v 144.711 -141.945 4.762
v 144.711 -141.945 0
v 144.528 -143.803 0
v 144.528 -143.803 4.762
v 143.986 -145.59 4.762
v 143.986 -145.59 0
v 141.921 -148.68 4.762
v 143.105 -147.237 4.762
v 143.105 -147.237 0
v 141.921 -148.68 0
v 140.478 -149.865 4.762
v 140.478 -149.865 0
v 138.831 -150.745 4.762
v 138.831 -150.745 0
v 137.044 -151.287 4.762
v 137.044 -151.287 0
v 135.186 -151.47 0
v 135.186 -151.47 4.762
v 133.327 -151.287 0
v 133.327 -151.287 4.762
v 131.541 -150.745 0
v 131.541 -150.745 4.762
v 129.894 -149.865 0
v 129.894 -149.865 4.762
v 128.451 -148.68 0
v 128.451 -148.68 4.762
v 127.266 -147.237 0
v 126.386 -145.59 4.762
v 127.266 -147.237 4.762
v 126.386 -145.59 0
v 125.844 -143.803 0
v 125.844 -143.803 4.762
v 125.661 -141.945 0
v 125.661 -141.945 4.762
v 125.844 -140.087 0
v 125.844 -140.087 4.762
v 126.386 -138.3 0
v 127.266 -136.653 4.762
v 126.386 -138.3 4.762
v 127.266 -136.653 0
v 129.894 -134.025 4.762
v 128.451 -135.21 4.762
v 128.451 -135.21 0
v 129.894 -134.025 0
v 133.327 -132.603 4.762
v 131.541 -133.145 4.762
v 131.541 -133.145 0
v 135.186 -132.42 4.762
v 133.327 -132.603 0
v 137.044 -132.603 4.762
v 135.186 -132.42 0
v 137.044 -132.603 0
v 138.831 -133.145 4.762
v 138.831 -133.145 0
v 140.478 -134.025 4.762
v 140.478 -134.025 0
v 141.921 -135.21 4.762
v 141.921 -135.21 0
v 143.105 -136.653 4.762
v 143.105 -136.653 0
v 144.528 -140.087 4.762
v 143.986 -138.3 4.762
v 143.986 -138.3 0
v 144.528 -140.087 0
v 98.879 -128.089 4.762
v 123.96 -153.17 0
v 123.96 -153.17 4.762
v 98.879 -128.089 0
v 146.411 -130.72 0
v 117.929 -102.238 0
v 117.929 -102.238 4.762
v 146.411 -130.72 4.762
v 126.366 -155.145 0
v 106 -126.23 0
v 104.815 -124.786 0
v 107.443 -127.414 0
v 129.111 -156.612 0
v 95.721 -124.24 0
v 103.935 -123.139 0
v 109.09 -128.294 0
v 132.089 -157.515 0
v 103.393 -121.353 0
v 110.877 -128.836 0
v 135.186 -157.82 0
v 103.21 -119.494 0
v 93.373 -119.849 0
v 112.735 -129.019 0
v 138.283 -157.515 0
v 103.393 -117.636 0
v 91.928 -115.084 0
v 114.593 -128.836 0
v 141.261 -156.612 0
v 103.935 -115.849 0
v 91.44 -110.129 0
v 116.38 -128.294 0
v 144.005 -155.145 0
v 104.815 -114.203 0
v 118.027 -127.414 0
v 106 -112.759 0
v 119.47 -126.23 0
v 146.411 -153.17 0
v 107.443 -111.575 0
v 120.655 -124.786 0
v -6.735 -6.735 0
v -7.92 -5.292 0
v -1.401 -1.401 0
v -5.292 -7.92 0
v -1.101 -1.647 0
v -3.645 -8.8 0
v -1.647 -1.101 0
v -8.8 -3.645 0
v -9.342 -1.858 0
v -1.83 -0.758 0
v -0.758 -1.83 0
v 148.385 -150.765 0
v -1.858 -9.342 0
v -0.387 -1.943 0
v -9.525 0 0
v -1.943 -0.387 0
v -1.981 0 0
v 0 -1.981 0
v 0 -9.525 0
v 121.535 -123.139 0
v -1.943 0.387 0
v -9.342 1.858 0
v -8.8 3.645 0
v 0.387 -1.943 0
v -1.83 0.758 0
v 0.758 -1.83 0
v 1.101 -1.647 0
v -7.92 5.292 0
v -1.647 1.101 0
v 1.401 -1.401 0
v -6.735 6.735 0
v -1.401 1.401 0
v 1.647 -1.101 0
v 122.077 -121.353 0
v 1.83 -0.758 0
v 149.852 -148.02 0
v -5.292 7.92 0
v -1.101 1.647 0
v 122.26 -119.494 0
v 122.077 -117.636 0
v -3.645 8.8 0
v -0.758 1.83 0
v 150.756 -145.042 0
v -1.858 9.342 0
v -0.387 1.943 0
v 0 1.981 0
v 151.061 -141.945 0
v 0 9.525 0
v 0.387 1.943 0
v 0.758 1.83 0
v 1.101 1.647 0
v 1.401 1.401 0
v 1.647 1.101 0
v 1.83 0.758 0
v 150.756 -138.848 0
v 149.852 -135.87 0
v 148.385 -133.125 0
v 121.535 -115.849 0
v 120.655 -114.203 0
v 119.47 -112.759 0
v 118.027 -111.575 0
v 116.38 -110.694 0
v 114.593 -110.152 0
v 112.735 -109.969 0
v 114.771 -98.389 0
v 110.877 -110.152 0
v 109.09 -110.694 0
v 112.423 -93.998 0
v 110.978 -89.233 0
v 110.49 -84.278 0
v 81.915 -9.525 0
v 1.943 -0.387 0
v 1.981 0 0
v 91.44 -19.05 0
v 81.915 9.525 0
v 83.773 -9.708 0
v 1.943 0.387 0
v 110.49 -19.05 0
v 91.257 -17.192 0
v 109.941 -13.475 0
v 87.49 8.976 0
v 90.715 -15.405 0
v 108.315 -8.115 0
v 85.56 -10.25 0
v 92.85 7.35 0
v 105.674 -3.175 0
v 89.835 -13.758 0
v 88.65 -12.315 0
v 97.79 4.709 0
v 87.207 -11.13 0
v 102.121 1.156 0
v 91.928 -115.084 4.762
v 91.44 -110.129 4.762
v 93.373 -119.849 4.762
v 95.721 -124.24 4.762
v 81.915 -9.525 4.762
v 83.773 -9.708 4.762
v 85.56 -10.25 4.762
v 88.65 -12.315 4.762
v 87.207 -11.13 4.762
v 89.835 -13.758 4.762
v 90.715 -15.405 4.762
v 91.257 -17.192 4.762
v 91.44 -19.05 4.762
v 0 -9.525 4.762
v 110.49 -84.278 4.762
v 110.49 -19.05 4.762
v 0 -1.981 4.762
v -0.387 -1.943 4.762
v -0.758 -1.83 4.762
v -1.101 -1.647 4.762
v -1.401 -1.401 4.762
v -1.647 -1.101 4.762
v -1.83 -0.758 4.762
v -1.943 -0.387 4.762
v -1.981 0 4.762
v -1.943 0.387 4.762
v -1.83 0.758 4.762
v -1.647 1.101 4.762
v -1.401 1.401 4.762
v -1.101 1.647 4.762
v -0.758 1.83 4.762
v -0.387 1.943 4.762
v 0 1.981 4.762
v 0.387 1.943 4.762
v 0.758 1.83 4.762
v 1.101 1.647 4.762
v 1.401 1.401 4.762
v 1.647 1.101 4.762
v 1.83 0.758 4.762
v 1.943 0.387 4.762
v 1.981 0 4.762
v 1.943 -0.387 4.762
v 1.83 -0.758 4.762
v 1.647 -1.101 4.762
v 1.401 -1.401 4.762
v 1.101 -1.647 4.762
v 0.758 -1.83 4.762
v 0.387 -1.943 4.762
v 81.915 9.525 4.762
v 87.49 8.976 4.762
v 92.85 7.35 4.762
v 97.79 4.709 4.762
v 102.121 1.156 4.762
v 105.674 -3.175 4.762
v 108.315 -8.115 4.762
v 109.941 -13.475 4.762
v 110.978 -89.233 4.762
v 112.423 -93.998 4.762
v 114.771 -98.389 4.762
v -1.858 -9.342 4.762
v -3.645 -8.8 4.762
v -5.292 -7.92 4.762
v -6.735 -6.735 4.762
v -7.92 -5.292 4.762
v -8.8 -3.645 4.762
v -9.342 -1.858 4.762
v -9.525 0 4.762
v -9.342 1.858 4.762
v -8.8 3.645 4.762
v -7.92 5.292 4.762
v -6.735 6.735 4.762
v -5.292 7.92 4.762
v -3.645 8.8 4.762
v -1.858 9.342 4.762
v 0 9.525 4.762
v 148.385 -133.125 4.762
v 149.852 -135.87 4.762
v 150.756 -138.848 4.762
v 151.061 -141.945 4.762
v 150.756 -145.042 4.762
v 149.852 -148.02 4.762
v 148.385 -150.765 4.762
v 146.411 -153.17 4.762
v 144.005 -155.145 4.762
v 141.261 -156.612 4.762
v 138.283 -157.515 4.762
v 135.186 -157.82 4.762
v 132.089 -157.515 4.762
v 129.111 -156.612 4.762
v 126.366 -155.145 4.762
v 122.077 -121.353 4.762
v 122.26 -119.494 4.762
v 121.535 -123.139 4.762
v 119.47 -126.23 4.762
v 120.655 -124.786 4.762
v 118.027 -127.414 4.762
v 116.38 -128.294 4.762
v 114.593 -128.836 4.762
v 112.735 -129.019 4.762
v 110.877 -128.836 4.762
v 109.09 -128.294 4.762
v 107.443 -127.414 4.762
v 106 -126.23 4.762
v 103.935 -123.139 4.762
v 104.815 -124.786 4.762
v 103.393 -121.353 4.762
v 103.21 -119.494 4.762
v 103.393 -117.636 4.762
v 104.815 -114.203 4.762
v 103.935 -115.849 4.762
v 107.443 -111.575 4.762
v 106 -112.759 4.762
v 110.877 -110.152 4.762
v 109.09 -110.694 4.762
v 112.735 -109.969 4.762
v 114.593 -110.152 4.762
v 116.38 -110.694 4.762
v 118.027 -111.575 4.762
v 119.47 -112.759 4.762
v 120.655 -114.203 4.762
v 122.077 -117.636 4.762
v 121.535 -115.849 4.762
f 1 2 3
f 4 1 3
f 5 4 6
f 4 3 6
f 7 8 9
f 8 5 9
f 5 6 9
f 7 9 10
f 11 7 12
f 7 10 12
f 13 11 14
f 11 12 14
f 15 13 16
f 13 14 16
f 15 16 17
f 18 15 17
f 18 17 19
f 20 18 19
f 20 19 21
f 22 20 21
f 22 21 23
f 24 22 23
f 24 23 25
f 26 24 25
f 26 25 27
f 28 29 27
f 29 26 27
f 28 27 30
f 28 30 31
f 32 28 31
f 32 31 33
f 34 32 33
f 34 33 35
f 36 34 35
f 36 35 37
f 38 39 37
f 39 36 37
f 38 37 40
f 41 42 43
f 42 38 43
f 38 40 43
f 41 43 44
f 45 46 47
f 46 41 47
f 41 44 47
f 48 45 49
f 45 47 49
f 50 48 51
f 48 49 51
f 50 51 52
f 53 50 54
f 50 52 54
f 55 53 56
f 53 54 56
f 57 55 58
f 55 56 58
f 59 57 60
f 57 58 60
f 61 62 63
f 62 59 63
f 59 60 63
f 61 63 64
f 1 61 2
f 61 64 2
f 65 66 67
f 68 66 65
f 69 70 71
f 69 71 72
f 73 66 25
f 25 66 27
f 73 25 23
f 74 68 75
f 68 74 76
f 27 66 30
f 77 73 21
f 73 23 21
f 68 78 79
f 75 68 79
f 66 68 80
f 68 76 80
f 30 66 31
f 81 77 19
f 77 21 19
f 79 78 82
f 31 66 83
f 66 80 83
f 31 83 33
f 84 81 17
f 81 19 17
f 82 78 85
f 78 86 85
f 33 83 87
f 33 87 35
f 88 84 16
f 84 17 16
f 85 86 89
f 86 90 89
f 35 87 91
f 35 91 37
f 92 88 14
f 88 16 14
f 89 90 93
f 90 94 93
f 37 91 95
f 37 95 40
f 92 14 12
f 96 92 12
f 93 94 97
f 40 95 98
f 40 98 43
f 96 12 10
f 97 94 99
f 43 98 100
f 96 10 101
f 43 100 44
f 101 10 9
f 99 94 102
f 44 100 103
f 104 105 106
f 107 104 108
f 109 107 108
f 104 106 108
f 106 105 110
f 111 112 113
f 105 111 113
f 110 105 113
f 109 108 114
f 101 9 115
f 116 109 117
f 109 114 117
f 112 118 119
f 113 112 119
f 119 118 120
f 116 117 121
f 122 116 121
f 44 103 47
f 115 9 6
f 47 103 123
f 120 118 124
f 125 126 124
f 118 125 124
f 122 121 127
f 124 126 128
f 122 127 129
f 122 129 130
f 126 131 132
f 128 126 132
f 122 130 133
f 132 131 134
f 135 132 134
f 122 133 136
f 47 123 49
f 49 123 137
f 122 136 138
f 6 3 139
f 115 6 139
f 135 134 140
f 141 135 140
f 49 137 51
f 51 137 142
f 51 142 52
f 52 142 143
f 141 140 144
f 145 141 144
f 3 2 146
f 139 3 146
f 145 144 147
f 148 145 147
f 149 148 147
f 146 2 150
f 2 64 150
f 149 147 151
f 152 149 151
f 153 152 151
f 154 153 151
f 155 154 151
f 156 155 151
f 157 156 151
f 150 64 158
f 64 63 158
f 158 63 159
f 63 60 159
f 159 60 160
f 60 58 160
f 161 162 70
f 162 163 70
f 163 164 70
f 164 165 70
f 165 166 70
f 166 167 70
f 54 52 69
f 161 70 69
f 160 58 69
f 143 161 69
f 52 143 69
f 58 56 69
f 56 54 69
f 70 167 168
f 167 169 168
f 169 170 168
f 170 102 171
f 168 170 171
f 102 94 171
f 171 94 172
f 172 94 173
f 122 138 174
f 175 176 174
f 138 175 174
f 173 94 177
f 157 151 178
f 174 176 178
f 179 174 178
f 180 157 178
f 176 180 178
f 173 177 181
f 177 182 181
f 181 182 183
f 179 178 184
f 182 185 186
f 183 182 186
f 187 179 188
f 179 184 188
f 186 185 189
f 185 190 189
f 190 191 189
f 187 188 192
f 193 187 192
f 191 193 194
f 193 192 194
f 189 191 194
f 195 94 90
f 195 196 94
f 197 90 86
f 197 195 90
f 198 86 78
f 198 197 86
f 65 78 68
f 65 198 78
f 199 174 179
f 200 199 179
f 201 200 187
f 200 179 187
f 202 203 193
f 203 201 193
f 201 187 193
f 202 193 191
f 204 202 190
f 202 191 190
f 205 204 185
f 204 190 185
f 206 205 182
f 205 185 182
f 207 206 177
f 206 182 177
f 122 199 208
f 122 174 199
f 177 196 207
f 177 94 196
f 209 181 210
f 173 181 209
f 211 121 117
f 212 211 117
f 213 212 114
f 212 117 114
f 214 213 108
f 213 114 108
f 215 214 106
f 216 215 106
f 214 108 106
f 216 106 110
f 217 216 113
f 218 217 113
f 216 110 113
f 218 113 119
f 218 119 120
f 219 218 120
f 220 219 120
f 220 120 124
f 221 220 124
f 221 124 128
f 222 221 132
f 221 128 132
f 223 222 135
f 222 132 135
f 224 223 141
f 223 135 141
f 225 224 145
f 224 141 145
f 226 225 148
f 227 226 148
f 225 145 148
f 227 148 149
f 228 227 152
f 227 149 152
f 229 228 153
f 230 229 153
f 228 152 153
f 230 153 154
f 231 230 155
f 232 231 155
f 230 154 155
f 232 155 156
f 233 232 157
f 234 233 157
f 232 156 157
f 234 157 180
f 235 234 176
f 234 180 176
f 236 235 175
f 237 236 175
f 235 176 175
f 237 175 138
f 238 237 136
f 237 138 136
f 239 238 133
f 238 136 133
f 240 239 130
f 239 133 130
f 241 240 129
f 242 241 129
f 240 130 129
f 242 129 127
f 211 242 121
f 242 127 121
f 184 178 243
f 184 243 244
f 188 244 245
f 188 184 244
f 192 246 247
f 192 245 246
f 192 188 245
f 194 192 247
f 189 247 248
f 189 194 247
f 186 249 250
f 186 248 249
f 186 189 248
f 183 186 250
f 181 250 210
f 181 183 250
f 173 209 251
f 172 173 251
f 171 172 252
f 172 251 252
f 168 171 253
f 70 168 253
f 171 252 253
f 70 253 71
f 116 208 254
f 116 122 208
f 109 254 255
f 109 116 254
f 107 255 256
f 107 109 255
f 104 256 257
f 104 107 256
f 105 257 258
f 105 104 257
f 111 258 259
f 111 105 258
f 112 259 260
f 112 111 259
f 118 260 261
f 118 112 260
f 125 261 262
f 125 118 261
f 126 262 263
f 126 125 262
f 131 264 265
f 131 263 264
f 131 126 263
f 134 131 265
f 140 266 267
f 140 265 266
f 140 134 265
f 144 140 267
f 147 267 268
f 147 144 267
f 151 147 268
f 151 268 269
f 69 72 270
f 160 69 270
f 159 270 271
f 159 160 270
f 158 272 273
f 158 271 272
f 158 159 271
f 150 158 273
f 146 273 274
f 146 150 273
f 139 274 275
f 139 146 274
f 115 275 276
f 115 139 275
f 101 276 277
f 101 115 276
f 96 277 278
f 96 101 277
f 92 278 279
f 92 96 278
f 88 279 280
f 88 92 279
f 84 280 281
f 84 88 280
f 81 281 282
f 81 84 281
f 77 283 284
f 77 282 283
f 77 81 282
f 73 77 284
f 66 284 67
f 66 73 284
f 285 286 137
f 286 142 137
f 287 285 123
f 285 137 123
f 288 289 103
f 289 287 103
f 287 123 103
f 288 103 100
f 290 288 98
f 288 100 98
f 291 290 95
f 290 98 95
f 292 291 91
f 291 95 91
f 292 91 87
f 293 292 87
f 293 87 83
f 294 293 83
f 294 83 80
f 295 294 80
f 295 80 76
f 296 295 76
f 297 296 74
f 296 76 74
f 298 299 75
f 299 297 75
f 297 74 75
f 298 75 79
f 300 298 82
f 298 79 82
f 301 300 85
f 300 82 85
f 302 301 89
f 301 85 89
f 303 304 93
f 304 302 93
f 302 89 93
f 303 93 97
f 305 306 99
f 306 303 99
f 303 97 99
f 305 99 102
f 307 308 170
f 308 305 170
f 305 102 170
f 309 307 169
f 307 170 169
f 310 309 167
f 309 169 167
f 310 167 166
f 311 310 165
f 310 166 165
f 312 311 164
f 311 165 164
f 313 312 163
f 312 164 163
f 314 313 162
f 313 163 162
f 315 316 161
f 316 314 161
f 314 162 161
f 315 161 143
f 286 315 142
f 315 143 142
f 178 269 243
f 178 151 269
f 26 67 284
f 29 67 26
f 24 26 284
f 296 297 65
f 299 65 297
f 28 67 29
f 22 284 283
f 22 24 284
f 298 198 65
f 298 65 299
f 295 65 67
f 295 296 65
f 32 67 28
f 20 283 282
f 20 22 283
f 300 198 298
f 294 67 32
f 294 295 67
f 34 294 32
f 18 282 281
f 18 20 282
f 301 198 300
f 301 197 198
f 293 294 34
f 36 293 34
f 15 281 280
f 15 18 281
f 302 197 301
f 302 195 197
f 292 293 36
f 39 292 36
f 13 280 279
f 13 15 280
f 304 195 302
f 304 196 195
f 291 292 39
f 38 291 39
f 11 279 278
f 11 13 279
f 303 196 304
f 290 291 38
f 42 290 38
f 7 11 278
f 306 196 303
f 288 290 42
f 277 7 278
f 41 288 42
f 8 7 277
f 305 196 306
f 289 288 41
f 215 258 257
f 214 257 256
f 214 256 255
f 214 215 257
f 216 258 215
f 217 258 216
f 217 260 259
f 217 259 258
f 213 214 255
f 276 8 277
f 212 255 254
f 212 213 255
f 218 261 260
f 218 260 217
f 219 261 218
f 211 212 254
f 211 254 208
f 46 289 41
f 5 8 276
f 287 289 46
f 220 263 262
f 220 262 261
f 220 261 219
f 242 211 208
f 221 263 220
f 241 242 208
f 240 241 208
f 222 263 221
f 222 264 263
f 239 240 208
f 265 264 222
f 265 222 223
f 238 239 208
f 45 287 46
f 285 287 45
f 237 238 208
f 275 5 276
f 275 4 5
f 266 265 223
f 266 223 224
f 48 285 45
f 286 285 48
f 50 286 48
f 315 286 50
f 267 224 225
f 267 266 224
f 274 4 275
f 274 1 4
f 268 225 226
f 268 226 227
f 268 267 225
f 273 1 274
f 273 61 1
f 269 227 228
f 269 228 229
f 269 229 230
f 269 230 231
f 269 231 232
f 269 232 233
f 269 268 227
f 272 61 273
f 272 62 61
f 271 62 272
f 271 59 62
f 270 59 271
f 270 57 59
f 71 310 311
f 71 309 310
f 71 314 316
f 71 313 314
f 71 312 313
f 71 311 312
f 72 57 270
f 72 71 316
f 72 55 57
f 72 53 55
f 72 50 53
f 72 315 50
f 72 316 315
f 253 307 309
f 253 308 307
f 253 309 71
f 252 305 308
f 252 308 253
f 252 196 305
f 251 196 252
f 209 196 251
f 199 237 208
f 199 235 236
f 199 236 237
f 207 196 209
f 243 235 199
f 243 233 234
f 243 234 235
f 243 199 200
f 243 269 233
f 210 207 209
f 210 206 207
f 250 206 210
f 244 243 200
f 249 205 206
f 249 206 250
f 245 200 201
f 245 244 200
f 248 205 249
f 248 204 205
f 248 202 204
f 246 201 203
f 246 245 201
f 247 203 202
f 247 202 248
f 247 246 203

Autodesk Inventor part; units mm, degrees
ref_plane "YZ Plane" through (0, 0, 0) normal (1, 0, 0) x (0, 1, 0)
ref_plane "XZ Plane" through (0, 0, 0) normal (0, 1, 0) x (-1, 0, 0)
ref_plane "XY Plane" through (0, 0, 0) normal (0, 0, 1) x (1, 0, 0)
sketch "Sketch1" plane through (0, 0, 0) normal (0, 0, 1) x (1, 0, 0)
  circle A0 centre (0, 0) radius 9.525
  line L0 (0, 9.525) -> (81.915, 9.525)
  arc A1 (110.49, -19.05) -> (81.915, 9.525) centre (81.915, -19.05) ccw
  line L1 (110.49, -19.05) -> (110.49, -94.7987)
  line L2 (110.49, -94.7987) -> (146.411, -130.7197)
  arc A2 (123.9604, -153.1704) -> (146.411, -130.7197) centre (135.1857, -141.9451) ccw
  line L3 (123.9604, -153.1704) -> (91.44, -120.65)
  line L4 (91.44, -120.65) -> (91.44, -19.05)
  arc A3 (91.44, -19.05) -> (81.915, -9.525) centre (81.915, -19.05) ccw
  line L5 (81.915, -9.525) -> (0, -9.525)
  circle A4 centre (135.1857, -141.9451) radius 9.525
  circle A5 centre (112.7351, -119.4944) radius 9.525
  line L6 (135.1857, -141.9451) -> (112.7351, -119.4944) construction
  dimension "d0" = 19.05
  dimension "d1" = 9.525
  dimension "d4" = 91.44
  dimension "d5" = 101.6
  dimension "d6" = 31.75
  dimension "d7" = 50.8
  dimension "d8" = 19.05
  dimension "d9" = 19.05
  dimension "d10" = 31.75
  dimension "d11" = 135
extrude "Extrusion1" add sketch "Sketch1" along normal blind 4.7625
sketch "Sketch2" plane through (0, 0, 4.7625) normal (0, 0, 1) x (1, 0, 0)
  arc A0 (0, 9.525) -> (0, -9.525) centre (0, 0) ccw construction
hole "Hole1" at (0, 0, 4.7625) direction (0, 0, -1) diameter 3.9624 end through all thread size "10-32 UNF" class "2B" standard "ANSI Unified Screw Threads"
fillet "Fillet1" radius 25.4 2 edges at (110.49, -94.7987, 2.3813) (91.44, -120.65, 2.3813)
equation "\"BendRadius\" = Thickness"
equation "\"BendReliefWidth\" = Thickness"
equation "\"BendReliefDepth\" = 0.5 * Thickness"
equation "\"CornerReliefSize\" = 4 * Thickness"
equation "\"MinimumRemnant\" = 2 * Thickness"
equation "\"TransitionRadius\" = BendRadius"
equation "\"JacobiRadiusSize\" = BendRadius"
equation "\"GapSize\" = Thickness"
equation "\"Thickness\" = 3.048"
properties part number "ARM,KICKER"
